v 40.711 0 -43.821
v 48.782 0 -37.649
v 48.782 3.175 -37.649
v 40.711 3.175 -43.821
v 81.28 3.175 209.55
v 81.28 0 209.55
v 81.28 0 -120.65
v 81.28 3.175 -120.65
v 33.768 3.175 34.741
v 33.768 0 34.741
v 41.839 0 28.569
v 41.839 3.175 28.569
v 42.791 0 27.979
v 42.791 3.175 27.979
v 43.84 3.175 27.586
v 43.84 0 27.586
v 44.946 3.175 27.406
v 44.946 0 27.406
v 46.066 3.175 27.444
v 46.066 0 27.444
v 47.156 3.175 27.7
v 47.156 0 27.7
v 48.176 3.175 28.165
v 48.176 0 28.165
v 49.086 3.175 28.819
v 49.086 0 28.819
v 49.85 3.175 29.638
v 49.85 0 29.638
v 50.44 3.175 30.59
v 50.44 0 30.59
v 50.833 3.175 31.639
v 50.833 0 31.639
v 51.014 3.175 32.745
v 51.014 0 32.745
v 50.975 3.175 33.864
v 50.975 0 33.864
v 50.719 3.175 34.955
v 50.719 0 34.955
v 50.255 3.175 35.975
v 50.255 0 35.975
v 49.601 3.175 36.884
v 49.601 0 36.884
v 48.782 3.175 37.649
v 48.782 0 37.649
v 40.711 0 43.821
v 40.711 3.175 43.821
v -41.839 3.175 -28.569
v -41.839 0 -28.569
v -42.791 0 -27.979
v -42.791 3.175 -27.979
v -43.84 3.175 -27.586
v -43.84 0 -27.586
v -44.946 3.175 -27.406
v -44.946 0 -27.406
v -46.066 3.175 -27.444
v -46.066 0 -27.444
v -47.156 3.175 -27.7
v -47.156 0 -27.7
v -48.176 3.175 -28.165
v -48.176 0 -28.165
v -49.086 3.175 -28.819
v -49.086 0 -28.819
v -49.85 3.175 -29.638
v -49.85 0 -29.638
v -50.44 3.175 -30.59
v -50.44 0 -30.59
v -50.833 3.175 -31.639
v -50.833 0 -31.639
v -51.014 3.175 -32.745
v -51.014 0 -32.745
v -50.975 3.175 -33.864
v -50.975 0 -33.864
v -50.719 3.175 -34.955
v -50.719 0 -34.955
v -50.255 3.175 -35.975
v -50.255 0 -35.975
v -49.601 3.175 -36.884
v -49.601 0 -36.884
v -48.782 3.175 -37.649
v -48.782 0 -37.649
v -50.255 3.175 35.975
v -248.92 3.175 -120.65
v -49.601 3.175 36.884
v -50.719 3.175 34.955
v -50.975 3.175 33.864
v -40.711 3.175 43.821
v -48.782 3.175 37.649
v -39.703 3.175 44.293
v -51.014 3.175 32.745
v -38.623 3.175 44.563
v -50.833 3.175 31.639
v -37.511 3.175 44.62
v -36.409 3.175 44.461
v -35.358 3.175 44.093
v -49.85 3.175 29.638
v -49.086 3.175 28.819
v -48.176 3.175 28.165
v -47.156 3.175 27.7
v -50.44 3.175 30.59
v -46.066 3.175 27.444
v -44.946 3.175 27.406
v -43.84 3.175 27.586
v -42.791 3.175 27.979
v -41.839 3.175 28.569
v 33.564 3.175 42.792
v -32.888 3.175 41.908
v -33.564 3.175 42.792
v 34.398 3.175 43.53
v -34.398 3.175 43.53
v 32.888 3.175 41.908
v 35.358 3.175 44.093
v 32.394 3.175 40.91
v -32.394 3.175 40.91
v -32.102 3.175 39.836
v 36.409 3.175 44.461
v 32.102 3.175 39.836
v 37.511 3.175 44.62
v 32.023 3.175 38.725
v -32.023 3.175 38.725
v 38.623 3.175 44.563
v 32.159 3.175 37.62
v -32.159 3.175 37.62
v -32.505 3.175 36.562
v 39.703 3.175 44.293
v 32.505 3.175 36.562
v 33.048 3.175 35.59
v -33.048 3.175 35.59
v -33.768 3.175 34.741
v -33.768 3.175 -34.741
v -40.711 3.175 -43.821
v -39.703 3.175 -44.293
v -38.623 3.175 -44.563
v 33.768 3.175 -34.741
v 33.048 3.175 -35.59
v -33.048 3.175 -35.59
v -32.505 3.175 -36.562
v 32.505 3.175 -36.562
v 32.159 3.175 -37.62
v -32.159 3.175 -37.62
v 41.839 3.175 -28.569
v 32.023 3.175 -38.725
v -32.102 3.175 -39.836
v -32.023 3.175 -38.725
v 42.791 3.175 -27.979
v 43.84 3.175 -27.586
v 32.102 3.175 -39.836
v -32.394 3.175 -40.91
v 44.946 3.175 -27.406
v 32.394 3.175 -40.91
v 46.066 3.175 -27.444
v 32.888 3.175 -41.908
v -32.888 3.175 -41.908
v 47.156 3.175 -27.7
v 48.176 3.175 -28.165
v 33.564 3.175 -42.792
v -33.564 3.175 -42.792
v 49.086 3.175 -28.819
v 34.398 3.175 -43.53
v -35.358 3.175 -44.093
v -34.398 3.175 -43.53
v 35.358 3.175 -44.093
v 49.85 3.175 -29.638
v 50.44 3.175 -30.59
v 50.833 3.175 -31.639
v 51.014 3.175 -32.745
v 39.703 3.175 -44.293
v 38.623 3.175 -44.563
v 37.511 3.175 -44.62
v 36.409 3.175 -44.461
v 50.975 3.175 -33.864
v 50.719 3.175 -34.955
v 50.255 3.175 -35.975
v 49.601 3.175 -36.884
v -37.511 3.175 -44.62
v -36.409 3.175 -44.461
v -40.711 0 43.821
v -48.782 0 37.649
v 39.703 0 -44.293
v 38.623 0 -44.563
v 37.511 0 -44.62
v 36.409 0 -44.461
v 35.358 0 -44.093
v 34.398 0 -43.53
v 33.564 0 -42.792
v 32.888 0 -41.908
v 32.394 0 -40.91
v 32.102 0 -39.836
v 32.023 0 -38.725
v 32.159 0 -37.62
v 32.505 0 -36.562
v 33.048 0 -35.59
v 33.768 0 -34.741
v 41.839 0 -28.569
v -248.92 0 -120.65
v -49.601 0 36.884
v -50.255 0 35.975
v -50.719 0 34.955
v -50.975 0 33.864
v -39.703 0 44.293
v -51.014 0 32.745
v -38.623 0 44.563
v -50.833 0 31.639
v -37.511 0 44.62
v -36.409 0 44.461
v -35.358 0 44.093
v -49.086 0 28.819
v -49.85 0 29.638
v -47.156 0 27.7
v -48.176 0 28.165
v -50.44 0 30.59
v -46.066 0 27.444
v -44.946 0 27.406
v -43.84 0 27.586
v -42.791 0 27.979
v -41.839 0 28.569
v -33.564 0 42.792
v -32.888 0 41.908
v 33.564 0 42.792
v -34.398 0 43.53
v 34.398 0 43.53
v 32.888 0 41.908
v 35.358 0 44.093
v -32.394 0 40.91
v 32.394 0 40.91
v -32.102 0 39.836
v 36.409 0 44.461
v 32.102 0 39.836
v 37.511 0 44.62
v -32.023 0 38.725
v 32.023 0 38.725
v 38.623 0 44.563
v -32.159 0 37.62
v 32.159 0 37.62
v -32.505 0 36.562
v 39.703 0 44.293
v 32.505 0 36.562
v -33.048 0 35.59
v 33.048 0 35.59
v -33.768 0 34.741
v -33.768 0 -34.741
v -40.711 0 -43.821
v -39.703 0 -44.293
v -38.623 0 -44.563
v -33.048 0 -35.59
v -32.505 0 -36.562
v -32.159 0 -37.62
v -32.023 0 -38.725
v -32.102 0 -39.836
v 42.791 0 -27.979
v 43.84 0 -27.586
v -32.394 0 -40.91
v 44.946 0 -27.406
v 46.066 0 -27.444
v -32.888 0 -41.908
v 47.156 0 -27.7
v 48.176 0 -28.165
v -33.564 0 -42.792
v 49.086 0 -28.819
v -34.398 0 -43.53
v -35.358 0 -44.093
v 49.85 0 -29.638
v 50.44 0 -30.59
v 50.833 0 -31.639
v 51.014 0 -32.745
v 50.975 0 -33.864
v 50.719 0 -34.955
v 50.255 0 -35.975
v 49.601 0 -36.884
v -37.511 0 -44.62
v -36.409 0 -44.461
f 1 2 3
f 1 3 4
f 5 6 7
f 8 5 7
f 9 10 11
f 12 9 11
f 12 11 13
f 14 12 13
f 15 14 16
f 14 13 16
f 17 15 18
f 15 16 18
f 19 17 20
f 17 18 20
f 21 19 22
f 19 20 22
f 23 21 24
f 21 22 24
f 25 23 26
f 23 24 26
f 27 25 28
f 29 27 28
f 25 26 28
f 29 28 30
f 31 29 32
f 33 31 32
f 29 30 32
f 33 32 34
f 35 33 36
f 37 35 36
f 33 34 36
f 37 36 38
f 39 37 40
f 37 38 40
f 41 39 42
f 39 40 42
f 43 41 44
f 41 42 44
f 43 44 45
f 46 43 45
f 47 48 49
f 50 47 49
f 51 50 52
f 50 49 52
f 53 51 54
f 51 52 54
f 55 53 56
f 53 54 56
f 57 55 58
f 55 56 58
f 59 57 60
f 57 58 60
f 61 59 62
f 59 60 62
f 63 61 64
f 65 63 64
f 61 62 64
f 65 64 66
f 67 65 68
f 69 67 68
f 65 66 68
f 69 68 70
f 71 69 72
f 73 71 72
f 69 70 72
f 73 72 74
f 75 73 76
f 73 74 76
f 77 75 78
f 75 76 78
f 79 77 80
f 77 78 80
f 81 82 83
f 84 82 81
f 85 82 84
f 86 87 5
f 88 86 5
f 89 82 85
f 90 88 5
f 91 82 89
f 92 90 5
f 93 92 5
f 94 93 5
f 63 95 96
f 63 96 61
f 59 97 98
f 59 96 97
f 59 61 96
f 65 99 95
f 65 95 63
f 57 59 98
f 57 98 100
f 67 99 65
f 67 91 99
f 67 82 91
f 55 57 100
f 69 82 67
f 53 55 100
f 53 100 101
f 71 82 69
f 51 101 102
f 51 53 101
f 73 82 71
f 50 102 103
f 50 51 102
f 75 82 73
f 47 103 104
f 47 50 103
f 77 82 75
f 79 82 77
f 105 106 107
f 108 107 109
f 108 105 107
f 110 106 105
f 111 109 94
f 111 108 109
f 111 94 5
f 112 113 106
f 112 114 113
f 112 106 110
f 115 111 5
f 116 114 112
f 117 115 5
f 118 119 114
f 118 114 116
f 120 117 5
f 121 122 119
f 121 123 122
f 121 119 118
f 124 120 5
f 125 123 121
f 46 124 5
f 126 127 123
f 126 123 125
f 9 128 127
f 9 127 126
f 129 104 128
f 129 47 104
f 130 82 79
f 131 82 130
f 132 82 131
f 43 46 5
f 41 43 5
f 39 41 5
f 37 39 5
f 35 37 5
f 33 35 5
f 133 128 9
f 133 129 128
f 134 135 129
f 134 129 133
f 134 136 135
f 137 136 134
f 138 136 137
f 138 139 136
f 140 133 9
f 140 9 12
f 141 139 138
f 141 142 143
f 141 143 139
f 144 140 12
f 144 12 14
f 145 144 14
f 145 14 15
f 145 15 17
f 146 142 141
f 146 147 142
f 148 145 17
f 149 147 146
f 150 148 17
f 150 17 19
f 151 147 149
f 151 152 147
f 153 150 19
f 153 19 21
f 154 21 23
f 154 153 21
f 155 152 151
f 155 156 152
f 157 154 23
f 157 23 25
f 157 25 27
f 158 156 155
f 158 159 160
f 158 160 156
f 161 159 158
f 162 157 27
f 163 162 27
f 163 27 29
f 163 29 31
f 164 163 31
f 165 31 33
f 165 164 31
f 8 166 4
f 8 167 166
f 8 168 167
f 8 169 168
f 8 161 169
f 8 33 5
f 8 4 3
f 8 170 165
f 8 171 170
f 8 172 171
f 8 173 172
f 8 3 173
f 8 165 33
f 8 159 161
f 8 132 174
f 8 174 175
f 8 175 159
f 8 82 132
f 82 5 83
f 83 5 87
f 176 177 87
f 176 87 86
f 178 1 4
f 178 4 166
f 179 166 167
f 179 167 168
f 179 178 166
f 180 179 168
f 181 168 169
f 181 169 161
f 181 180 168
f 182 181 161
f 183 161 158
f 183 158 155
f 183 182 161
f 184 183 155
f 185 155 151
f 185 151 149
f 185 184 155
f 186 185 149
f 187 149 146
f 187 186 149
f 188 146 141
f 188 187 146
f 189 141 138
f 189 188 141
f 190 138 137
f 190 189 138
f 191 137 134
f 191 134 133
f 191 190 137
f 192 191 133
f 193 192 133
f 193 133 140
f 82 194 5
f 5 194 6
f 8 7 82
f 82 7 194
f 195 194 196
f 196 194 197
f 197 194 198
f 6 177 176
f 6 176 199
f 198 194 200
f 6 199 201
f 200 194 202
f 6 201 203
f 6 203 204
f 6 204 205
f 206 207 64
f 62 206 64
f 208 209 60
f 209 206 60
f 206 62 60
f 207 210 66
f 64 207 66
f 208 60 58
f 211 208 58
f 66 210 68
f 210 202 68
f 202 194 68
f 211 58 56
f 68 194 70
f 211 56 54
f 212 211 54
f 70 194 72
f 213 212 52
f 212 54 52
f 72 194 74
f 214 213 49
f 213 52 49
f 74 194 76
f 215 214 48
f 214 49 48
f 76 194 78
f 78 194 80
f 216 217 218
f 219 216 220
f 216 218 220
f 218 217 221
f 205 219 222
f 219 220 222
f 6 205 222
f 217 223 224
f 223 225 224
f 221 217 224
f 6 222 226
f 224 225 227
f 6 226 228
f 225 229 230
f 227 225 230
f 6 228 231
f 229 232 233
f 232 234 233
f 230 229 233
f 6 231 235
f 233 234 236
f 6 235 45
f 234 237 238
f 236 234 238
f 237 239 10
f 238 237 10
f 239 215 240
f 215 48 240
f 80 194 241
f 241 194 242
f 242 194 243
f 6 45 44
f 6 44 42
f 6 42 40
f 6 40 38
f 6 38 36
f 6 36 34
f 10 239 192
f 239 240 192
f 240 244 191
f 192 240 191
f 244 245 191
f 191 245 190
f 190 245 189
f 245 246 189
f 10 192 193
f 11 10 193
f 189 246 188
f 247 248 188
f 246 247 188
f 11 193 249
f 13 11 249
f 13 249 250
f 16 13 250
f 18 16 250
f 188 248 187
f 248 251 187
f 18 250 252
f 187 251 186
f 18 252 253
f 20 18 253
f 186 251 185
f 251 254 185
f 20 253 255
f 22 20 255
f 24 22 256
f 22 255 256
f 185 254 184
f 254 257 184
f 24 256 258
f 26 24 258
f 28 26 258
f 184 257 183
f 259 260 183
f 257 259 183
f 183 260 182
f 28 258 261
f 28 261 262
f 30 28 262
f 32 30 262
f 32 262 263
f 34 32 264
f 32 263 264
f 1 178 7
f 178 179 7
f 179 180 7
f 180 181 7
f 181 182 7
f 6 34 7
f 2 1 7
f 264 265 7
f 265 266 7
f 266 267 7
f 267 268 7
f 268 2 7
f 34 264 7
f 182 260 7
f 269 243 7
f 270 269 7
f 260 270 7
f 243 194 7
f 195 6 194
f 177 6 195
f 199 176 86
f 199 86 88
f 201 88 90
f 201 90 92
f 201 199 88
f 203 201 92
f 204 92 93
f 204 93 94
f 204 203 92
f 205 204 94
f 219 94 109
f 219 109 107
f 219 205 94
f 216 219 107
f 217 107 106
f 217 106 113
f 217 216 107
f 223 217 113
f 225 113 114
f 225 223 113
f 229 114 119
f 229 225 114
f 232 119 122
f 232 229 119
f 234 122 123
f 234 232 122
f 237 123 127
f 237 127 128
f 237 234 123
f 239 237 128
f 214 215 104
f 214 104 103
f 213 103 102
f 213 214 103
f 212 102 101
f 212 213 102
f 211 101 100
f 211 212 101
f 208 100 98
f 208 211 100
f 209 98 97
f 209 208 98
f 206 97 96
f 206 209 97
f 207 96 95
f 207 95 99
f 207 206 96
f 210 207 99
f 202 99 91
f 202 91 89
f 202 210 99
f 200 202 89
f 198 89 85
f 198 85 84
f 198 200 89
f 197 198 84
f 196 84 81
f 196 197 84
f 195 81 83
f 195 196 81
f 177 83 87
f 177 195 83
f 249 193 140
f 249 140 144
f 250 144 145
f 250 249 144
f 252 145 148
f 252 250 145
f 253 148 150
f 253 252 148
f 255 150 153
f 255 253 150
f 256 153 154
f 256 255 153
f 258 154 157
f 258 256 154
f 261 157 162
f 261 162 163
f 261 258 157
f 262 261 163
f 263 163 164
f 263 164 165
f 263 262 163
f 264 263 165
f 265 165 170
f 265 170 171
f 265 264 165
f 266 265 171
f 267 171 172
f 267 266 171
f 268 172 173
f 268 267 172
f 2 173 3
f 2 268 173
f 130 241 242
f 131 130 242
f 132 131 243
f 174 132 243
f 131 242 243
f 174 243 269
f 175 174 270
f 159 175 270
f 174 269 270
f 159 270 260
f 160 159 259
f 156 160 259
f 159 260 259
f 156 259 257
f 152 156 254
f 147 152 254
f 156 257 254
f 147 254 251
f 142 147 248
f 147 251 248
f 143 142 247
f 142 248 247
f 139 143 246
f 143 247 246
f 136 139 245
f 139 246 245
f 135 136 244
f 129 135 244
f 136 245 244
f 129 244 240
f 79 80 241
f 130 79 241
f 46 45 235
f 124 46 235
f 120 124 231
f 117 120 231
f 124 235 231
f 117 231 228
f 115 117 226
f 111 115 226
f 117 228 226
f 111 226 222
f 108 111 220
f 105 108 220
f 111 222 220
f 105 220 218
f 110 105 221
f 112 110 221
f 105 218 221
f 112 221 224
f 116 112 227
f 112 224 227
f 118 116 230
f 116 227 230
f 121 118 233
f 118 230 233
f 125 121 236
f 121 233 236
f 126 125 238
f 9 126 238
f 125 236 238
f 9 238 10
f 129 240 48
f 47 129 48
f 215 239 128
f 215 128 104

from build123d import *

# Parameters (mm, degrees)
BOSS_EXTRUDE1_DEPTH = 3.175


with BuildPart() as part:
    # Sketch1 → Boss-Extrude1 (new body)
    with BuildSketch(Plane(origin=(0, 0, 0), x_dir=(1, 0, 0), z_dir=(0, 1, 0))):
        Polygon((81.28, -209.55), (81.28, 120.65), (-248.92, 120.65), align=None)
        with BuildLine():
            Line((-48.781915156, 37.648908469), (-40.711239573, 43.820601562))
            ThreePointArc((-40.711239573, 43.820601562), (-33.204324417, 42.366693093), (-33.768084844, 34.741091531))
            Line((-33.768084844, 34.741091531), (-41.838760427, 28.569398438))
            ThreePointArc((-41.838760427, 28.569398438), (-49.850092807, 29.637576089), (-48.781915156, 37.648908469))
        make_face(mode=Mode.SUBTRACT)
        with BuildLine():
            Line((33.768084844, 34.741091531), (41.838760427, 28.569398438))
            ThreePointArc((41.838760427, 28.569398438), (49.850092807, 29.637576089), (48.781915156, 37.648908469))
            Line((48.781915156, 37.648908469), (40.711239573, 43.820601562))
            ThreePointArc((40.711239573, 43.820601562), (33.204324417, 42.366693093), (33.768084844, 34.741091531))
        make_face(mode=Mode.SUBTRACT)
        with BuildLine():
            Line((33.768084844, -34.741091531), (41.838760427, -28.569398438))
            ThreePointArc((41.838760427, -28.569398438), (49.850092807, -29.637576089), (48.781915156, -37.648908469))
            Line((48.781915156, -37.648908469), (40.711239573, -43.820601562))
            ThreePointArc((40.711239573, -43.820601562), (33.204324417, -42.366693093), (33.768084844, -34.741091531))
        make_face(mode=Mode.SUBTRACT)
        with BuildLine():
            Line((-48.781915156, -37.648908469), (-40.711239573, -43.820601562))
            ThreePointArc((-40.711239573, -43.820601562), (-33.204324417, -42.366693093), (-33.768084844, -34.741091531))
            Line((-33.768084844, -34.741091531), (-41.838760427, -28.569398438))
            ThreePointArc((-41.838760427, -28.569398438), (-49.850092807, -29.637576089), (-48.781915156, -37.648908469))
        make_face(mode=Mode.SUBTRACT)
    extrude(amount=BOSS_EXTRUDE1_DEPTH)


solid = part.part
